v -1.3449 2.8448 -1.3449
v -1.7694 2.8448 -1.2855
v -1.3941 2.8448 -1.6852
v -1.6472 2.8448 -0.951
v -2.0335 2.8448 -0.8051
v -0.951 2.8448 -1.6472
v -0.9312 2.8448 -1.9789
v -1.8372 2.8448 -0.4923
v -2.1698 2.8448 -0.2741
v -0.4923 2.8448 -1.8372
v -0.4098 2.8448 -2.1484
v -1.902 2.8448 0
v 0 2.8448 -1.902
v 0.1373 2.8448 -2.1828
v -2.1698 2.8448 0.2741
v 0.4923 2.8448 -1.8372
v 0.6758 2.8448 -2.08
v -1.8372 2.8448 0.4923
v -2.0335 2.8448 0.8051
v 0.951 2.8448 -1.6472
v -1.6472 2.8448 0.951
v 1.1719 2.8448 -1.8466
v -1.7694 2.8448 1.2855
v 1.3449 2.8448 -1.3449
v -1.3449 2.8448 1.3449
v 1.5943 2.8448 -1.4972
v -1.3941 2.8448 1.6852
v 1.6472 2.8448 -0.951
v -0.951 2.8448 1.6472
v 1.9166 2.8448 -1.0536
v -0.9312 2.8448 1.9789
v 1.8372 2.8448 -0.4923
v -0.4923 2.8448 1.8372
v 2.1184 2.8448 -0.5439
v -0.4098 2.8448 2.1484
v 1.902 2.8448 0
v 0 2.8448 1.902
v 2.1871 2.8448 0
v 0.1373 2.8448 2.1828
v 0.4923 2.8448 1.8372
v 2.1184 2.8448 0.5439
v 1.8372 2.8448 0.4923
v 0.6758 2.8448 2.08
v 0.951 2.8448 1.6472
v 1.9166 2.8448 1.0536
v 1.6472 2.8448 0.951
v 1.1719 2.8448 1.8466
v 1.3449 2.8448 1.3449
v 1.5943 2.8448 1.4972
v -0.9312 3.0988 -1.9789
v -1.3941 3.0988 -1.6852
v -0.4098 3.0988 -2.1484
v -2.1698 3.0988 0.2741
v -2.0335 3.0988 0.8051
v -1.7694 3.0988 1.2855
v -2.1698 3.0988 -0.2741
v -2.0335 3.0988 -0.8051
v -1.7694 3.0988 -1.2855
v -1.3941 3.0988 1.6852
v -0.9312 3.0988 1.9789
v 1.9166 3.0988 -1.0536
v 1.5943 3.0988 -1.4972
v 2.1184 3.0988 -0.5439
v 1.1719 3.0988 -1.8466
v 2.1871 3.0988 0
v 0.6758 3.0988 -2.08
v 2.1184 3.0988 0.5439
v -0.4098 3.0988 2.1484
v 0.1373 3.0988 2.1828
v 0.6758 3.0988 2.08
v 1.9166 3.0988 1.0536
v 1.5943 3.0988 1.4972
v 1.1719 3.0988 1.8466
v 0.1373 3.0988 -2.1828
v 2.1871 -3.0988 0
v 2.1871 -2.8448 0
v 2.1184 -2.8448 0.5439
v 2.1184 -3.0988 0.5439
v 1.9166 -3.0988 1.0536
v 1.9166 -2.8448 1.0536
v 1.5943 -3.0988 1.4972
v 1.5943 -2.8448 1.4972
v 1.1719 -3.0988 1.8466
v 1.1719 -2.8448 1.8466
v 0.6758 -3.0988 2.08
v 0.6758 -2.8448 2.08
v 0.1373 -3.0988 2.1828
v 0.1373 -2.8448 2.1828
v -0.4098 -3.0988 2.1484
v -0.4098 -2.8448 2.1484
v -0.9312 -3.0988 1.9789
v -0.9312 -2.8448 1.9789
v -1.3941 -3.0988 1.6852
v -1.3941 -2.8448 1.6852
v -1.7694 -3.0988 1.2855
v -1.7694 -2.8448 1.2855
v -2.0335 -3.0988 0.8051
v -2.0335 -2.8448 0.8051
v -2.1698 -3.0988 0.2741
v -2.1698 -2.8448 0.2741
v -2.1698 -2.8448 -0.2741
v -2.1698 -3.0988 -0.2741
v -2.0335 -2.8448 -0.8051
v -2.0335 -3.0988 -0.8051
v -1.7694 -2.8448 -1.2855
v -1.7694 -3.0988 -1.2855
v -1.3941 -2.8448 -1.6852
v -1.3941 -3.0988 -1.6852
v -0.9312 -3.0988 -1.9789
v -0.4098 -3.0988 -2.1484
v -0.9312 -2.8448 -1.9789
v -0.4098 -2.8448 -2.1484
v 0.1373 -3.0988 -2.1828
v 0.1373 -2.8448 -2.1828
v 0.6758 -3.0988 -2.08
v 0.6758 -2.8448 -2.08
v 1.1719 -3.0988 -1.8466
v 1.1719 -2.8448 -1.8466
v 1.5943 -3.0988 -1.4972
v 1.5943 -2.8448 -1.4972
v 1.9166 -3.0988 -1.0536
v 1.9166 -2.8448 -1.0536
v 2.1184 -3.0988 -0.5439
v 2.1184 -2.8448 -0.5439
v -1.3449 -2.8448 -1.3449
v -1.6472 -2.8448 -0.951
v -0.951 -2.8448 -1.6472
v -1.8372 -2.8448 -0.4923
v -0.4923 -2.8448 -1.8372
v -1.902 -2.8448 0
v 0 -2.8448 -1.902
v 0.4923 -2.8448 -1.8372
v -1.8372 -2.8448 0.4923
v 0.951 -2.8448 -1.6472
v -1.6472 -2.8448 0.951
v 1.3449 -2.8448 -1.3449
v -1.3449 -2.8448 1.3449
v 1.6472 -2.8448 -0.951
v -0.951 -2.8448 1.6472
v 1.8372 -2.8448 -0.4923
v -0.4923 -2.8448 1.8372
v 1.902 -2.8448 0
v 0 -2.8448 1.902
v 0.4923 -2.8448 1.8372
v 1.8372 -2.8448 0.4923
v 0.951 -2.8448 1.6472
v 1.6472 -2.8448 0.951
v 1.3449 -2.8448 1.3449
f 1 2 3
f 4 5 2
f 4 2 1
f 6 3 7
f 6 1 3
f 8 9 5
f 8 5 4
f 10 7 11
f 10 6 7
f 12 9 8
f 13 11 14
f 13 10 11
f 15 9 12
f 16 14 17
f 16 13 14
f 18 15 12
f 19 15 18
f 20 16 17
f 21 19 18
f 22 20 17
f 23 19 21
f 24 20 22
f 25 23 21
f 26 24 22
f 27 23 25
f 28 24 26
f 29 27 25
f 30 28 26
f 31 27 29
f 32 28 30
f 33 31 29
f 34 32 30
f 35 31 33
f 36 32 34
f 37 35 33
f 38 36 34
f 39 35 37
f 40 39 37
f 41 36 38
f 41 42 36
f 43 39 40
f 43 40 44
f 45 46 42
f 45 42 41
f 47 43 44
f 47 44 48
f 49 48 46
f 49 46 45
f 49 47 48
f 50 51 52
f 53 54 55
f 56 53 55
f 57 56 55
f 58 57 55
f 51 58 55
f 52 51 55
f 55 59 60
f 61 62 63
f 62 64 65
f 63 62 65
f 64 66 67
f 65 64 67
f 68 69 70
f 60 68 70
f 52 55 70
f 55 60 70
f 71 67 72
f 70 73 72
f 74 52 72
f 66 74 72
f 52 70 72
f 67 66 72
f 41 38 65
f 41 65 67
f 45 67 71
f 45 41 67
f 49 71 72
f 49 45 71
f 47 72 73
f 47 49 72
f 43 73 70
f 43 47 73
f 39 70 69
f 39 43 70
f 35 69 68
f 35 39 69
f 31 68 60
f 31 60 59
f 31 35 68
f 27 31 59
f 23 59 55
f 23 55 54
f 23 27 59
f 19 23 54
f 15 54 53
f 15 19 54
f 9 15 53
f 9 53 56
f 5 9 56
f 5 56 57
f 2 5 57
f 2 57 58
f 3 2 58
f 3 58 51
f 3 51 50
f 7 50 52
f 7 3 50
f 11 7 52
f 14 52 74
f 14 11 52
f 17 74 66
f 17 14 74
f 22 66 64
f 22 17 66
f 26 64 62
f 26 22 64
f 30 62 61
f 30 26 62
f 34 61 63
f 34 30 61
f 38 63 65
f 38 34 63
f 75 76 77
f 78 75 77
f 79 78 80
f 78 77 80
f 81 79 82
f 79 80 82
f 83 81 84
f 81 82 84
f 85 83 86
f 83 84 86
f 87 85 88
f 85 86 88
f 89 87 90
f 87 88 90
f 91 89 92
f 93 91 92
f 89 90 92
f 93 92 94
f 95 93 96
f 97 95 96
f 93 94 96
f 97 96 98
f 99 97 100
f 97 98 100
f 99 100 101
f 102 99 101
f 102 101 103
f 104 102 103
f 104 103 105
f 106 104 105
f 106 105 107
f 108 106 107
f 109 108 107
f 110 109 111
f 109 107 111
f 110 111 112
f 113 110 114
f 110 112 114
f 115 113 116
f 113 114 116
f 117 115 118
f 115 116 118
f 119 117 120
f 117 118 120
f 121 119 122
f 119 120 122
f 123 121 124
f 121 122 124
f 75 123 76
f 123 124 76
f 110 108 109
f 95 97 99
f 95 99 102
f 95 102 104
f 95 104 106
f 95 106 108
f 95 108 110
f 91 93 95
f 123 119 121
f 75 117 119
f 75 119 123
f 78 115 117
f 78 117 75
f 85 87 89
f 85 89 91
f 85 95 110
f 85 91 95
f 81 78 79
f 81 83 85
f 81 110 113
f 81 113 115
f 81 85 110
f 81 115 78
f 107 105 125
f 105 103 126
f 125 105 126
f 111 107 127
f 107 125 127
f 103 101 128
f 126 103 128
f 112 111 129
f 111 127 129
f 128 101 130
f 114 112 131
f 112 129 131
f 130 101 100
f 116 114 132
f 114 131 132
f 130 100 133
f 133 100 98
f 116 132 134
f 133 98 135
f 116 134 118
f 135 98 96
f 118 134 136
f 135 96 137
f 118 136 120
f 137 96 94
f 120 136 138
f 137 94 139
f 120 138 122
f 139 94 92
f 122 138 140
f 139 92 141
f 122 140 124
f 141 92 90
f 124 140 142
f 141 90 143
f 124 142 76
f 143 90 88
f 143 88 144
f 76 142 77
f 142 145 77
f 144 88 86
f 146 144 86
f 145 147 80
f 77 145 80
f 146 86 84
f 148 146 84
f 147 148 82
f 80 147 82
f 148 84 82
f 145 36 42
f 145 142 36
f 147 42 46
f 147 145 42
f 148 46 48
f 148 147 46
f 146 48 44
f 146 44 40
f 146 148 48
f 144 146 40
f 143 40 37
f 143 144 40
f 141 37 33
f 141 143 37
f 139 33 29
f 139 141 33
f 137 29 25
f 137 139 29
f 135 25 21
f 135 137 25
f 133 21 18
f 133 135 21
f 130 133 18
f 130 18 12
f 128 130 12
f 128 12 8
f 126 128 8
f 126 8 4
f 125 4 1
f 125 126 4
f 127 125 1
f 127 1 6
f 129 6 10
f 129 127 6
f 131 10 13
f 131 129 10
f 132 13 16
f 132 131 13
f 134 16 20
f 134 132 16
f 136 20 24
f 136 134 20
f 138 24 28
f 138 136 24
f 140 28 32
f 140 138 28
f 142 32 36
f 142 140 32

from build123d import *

# Parameters (mm, degrees)
F0_R          = 1.9020393282
F1_DEPTH      = 2.8448
F1_DEPTH_BACK = 2.8448
F2_R          = 2.1870906788
F3_DEPTH      = 0.254


# Not quite as in the source:
# - a pattern or mirror of a feature is missing from the dataset's text; its kind, count and spacing are read off the source's solid


with BuildPart() as f1:
    # F0 (on Front) → F1 (new body, two sides)
    with BuildSketch(Plane.XZ) as f1_sk:
        Circle(F0_R)
    extrude(amount=F1_DEPTH)
    extrude(f1_sk.sketch, amount=-F1_DEPTH_BACK)

    # F2 (on face) → F3 (join)
    with BuildSketch(Plane.XZ.offset(2.8448)):
        Circle(F2_R)
    f3 = extrude(amount=F3_DEPTH)

    # F3_copies: F3 across plane
    add(f3.mirror(Plane.ZX))


solid = f1.part
